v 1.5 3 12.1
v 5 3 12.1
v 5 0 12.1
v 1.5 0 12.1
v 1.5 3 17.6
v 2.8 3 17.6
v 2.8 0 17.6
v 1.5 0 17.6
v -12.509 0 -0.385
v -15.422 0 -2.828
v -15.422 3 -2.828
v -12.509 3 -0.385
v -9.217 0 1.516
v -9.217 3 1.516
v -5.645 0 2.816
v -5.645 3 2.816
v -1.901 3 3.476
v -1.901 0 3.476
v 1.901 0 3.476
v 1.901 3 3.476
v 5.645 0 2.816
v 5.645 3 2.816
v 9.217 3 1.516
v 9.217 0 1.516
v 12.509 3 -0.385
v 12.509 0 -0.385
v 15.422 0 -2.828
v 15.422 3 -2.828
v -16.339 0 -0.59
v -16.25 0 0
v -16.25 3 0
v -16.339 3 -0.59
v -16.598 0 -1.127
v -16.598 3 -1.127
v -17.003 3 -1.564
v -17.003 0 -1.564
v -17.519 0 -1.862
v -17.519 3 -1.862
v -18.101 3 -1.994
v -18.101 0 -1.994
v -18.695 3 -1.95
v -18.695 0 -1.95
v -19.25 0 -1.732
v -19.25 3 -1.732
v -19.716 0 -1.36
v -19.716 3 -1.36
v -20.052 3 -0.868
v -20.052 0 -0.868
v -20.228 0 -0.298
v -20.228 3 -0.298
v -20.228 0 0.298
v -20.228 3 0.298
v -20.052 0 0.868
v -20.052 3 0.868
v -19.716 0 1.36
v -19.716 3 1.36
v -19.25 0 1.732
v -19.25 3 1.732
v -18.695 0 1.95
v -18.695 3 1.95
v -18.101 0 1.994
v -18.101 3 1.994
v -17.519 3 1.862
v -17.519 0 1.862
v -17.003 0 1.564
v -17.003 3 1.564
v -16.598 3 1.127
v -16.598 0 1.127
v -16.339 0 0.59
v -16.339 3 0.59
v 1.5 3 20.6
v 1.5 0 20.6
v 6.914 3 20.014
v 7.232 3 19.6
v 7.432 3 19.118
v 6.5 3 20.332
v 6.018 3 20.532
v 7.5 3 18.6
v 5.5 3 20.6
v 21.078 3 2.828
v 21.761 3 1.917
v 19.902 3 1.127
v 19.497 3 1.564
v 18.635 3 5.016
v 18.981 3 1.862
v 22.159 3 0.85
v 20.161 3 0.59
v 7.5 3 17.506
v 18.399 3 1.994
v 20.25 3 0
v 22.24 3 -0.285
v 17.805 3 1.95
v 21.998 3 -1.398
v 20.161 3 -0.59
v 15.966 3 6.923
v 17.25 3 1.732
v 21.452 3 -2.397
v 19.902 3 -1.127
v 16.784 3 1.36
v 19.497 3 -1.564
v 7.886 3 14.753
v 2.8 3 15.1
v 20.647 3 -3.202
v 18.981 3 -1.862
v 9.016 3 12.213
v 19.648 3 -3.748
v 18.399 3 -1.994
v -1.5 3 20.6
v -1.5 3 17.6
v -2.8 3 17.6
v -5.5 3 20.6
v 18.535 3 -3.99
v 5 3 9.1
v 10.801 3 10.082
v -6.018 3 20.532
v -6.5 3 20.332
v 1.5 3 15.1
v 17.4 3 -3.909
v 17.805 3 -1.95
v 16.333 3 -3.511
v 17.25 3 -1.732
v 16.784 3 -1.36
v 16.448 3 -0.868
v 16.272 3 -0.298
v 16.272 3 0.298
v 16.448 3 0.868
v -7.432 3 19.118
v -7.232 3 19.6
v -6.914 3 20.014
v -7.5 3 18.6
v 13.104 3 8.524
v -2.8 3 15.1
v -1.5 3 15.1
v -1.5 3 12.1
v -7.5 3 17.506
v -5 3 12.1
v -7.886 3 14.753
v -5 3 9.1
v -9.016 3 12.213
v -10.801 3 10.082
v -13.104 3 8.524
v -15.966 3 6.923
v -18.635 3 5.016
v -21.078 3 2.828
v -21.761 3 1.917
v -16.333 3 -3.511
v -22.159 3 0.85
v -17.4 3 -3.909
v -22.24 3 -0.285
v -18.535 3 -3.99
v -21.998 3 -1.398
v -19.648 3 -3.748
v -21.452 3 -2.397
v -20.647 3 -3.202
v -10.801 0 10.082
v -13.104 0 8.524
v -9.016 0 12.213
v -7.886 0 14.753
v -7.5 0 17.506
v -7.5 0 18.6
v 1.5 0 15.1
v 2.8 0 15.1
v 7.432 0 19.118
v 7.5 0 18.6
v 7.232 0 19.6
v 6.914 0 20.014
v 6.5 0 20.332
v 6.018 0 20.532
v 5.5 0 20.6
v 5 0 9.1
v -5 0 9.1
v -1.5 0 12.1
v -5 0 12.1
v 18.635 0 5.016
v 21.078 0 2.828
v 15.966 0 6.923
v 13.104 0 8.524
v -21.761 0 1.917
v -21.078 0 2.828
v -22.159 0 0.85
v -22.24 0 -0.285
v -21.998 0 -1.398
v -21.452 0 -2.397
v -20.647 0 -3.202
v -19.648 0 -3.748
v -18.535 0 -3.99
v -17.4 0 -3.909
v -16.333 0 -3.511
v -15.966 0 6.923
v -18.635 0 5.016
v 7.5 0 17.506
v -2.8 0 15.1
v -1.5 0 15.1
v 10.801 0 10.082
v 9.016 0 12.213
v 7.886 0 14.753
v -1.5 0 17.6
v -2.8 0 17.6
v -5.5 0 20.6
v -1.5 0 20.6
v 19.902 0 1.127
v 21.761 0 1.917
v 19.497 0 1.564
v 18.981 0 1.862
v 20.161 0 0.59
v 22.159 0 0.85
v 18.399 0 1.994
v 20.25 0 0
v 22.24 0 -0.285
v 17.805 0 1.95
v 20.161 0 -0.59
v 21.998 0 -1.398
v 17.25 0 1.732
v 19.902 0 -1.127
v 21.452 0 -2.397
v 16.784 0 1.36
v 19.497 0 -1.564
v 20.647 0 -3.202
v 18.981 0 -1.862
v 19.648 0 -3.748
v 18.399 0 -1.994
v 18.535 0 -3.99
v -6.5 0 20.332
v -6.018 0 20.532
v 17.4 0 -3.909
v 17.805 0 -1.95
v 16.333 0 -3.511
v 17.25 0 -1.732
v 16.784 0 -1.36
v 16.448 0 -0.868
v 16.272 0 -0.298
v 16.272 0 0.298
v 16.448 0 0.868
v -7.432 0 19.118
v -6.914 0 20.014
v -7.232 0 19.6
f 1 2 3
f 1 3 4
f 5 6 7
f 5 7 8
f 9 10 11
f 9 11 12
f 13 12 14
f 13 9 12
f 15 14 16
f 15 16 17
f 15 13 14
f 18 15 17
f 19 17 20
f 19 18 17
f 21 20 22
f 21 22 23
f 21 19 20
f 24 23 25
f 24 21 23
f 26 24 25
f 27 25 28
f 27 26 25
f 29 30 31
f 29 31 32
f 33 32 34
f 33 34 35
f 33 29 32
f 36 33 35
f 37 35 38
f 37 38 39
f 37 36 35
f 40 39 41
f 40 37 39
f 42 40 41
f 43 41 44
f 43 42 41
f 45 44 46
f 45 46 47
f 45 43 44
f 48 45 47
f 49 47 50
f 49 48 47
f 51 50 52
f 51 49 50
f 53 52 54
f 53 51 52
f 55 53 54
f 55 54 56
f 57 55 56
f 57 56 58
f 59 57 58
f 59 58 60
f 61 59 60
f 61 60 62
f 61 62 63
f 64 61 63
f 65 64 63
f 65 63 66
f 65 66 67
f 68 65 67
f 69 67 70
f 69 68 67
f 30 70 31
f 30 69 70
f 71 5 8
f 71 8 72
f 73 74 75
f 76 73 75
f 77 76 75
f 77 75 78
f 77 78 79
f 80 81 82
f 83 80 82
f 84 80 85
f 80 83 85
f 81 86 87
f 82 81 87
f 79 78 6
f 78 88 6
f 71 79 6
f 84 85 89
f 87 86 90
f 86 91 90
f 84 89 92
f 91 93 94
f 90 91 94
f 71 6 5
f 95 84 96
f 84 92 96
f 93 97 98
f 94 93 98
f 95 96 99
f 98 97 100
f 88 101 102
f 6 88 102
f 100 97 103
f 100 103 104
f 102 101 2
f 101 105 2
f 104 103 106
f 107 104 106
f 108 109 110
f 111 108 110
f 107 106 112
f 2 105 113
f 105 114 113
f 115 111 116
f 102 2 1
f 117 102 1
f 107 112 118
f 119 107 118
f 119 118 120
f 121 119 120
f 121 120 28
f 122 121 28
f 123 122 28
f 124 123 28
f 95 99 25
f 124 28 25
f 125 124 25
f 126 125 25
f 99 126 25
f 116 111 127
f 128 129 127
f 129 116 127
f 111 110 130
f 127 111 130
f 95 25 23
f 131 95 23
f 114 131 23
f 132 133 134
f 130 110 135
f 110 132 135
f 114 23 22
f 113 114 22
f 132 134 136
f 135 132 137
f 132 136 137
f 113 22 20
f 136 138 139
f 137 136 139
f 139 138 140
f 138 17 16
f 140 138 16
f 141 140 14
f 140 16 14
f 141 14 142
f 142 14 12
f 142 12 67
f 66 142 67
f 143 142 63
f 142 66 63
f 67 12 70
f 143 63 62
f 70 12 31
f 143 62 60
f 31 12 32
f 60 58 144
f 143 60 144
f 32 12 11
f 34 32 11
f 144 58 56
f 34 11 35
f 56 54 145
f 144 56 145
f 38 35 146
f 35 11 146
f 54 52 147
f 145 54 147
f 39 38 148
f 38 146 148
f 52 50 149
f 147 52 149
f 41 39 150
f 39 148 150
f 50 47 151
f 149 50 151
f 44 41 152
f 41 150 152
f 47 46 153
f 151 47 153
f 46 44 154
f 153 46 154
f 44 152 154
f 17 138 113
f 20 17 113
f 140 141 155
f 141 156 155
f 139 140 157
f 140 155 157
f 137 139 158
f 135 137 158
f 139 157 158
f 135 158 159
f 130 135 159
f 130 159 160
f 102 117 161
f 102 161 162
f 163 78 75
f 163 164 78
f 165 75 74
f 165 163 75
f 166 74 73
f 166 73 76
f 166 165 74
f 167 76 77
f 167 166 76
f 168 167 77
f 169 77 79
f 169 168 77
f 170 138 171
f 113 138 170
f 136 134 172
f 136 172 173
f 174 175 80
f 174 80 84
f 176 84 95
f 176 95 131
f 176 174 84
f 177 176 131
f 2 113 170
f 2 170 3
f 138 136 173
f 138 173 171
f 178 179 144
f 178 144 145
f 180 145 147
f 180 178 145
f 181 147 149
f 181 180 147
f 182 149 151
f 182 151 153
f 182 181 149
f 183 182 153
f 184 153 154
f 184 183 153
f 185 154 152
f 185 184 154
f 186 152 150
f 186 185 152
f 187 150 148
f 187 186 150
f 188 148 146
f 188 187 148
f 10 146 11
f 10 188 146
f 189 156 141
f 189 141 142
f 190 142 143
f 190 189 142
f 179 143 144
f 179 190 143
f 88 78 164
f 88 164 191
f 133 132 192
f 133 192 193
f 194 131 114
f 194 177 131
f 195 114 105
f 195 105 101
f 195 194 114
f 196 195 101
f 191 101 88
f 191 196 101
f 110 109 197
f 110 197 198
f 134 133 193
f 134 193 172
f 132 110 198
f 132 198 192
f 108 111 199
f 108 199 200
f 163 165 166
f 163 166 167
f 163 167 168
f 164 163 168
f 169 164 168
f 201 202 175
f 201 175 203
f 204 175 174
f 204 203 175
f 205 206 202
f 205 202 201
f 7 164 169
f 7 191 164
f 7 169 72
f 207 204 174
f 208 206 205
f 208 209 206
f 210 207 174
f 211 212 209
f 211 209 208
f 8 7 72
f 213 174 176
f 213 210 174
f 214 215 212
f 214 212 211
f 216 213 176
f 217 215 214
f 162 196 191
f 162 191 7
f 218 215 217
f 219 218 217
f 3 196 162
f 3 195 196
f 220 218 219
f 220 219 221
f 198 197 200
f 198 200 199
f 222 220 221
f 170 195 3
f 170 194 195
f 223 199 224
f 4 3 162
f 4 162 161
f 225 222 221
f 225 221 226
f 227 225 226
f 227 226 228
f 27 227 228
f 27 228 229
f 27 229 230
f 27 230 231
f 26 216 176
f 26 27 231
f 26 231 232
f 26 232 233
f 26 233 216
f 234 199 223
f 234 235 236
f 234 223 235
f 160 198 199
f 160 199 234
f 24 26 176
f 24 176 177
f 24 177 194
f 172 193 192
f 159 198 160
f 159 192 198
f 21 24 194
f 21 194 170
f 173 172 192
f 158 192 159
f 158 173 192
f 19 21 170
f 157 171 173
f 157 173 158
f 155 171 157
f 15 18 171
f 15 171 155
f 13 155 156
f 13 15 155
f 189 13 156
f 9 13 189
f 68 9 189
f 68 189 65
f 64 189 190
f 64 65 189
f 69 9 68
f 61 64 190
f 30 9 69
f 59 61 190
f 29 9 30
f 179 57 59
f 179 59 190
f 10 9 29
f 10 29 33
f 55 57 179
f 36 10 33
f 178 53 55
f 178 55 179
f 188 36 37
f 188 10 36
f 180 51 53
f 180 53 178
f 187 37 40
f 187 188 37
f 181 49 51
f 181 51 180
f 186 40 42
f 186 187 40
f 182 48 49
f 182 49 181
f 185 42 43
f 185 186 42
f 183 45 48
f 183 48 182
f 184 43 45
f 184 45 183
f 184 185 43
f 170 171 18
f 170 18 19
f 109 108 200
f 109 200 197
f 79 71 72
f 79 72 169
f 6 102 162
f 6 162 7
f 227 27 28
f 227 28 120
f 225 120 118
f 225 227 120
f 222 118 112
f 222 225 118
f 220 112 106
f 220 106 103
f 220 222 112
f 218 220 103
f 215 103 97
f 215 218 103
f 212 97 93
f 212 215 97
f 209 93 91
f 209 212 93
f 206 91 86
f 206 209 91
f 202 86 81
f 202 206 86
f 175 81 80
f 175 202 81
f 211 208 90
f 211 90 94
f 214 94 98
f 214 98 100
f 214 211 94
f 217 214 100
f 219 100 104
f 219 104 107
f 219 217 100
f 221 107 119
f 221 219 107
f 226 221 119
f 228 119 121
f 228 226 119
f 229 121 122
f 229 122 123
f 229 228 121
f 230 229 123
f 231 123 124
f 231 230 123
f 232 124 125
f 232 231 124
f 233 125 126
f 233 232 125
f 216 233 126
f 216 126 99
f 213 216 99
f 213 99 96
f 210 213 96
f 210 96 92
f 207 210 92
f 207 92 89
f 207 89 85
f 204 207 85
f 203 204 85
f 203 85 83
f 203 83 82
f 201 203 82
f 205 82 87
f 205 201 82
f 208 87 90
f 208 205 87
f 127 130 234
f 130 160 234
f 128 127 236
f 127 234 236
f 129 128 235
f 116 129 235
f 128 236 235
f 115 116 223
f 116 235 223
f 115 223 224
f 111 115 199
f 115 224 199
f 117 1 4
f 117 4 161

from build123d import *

# Parameters (mm, degrees)
SKETCH1_R           = 2
BOSS_EXTRUDE1_DEPTH = 3
BOSS_EXTRUDE2_DEPTH = 3
CUT_EXTRUDE2_DEPTH  = 3
FILLET1_R           = 10
FILLET2_R           = 2


with BuildPart() as part:
    # Sketch1 → Boss-Extrude1 (new body)
    with BuildSketch(Plane(origin=(0, 0, 0), x_dir=(1, 0, 0), z_dir=(0, 1, 0))):
        with BuildLine():
            ThreePointArc((15.4216389, 2.828493148), (21.078493148, 2.8283611), (21.0783611, -2.828493148))
            ThreePointArc((21.0783611, -2.828493148), (0, -11.559147965), (-21.0783611, -2.828493148))
            ThreePointArc((-21.0783611, -2.828493148), (-21.078493148, 2.8283611), (-15.4216389, 2.828493148))
            ThreePointArc((-15.4216389, 2.828493148), (0, -3.559147965), (15.4216389, 2.828493148))
        make_face()
        with Locations((18.25, 0)):
            Circle(SKETCH1_R, mode=Mode.SUBTRACT)
        with Locations((-18.25, 0)):
            Circle(SKETCH1_R, mode=Mode.SUBTRACT)
    extrude(amount=BOSS_EXTRUDE1_DEPTH)

    # Sketch2 → Boss-Extrude2 (add)
    with BuildSketch(Plane(origin=(0, 3, 0), x_dir=(1, 0, 0), z_dir=(0, 1, 0))):
        with BuildLine():
            Line((-7.5, -10.600250197), (-7.5, -20.600250197))
            Line((-7.5, -20.600250197), (7.5, -20.600250197))
            Line((7.5, -20.600250197), (7.5, -10.600250197))
            ThreePointArc((7.5, -10.600250197), (0, -11.559147965), (-7.5, -10.600250197))
        make_face()
    extrude(amount=-BOSS_EXTRUDE2_DEPTH)

    # Sketch4 → Cut-Extrude2 (cut)
    with BuildSketch(Plane(origin=(0, 3, 0), x_dir=(1, 0, 0), z_dir=(0, 1, 0))):
        Polygon((-1.5, -20.600250197), (-1.5, -17.600250197), (-2.8, -17.600250197), (-2.8, -15.100250197), (-1.5, -15.100250197), (-1.5, -12.100250197), (-5, -12.100250197), (-5, -9.100250197), (5, -9.100250197), (5, -12.100250197), (1.5, -12.100250197), (1.5, -15.100250197), (2.8, -15.100250197), (2.8, -17.600250197), (1.5, -17.600250197), (1.5, -20.600250197), align=None)
    extrude(amount=-CUT_EXTRUDE2_DEPTH, mode=Mode.SUBTRACT)

    # Fillet1
    fillet1_edges = [part.edges().sort_by_distance(p)[0] for p in [
        (-7.5, 1.5, 10.600250197),
        (7.5, 1.5, 10.600250197),
    ]]
    fillet(fillet1_edges, radius=FILLET1_R)

    # Fillet2
    fillet2_edges = [part.edges().sort_by_distance(p)[0] for p in [
        (7.5, 1.5, 20.600250197),
        (-7.5, 1.5, 20.600250197),
    ]]
    fillet(fillet2_edges, radius=FILLET2_R)


solid = part.part
